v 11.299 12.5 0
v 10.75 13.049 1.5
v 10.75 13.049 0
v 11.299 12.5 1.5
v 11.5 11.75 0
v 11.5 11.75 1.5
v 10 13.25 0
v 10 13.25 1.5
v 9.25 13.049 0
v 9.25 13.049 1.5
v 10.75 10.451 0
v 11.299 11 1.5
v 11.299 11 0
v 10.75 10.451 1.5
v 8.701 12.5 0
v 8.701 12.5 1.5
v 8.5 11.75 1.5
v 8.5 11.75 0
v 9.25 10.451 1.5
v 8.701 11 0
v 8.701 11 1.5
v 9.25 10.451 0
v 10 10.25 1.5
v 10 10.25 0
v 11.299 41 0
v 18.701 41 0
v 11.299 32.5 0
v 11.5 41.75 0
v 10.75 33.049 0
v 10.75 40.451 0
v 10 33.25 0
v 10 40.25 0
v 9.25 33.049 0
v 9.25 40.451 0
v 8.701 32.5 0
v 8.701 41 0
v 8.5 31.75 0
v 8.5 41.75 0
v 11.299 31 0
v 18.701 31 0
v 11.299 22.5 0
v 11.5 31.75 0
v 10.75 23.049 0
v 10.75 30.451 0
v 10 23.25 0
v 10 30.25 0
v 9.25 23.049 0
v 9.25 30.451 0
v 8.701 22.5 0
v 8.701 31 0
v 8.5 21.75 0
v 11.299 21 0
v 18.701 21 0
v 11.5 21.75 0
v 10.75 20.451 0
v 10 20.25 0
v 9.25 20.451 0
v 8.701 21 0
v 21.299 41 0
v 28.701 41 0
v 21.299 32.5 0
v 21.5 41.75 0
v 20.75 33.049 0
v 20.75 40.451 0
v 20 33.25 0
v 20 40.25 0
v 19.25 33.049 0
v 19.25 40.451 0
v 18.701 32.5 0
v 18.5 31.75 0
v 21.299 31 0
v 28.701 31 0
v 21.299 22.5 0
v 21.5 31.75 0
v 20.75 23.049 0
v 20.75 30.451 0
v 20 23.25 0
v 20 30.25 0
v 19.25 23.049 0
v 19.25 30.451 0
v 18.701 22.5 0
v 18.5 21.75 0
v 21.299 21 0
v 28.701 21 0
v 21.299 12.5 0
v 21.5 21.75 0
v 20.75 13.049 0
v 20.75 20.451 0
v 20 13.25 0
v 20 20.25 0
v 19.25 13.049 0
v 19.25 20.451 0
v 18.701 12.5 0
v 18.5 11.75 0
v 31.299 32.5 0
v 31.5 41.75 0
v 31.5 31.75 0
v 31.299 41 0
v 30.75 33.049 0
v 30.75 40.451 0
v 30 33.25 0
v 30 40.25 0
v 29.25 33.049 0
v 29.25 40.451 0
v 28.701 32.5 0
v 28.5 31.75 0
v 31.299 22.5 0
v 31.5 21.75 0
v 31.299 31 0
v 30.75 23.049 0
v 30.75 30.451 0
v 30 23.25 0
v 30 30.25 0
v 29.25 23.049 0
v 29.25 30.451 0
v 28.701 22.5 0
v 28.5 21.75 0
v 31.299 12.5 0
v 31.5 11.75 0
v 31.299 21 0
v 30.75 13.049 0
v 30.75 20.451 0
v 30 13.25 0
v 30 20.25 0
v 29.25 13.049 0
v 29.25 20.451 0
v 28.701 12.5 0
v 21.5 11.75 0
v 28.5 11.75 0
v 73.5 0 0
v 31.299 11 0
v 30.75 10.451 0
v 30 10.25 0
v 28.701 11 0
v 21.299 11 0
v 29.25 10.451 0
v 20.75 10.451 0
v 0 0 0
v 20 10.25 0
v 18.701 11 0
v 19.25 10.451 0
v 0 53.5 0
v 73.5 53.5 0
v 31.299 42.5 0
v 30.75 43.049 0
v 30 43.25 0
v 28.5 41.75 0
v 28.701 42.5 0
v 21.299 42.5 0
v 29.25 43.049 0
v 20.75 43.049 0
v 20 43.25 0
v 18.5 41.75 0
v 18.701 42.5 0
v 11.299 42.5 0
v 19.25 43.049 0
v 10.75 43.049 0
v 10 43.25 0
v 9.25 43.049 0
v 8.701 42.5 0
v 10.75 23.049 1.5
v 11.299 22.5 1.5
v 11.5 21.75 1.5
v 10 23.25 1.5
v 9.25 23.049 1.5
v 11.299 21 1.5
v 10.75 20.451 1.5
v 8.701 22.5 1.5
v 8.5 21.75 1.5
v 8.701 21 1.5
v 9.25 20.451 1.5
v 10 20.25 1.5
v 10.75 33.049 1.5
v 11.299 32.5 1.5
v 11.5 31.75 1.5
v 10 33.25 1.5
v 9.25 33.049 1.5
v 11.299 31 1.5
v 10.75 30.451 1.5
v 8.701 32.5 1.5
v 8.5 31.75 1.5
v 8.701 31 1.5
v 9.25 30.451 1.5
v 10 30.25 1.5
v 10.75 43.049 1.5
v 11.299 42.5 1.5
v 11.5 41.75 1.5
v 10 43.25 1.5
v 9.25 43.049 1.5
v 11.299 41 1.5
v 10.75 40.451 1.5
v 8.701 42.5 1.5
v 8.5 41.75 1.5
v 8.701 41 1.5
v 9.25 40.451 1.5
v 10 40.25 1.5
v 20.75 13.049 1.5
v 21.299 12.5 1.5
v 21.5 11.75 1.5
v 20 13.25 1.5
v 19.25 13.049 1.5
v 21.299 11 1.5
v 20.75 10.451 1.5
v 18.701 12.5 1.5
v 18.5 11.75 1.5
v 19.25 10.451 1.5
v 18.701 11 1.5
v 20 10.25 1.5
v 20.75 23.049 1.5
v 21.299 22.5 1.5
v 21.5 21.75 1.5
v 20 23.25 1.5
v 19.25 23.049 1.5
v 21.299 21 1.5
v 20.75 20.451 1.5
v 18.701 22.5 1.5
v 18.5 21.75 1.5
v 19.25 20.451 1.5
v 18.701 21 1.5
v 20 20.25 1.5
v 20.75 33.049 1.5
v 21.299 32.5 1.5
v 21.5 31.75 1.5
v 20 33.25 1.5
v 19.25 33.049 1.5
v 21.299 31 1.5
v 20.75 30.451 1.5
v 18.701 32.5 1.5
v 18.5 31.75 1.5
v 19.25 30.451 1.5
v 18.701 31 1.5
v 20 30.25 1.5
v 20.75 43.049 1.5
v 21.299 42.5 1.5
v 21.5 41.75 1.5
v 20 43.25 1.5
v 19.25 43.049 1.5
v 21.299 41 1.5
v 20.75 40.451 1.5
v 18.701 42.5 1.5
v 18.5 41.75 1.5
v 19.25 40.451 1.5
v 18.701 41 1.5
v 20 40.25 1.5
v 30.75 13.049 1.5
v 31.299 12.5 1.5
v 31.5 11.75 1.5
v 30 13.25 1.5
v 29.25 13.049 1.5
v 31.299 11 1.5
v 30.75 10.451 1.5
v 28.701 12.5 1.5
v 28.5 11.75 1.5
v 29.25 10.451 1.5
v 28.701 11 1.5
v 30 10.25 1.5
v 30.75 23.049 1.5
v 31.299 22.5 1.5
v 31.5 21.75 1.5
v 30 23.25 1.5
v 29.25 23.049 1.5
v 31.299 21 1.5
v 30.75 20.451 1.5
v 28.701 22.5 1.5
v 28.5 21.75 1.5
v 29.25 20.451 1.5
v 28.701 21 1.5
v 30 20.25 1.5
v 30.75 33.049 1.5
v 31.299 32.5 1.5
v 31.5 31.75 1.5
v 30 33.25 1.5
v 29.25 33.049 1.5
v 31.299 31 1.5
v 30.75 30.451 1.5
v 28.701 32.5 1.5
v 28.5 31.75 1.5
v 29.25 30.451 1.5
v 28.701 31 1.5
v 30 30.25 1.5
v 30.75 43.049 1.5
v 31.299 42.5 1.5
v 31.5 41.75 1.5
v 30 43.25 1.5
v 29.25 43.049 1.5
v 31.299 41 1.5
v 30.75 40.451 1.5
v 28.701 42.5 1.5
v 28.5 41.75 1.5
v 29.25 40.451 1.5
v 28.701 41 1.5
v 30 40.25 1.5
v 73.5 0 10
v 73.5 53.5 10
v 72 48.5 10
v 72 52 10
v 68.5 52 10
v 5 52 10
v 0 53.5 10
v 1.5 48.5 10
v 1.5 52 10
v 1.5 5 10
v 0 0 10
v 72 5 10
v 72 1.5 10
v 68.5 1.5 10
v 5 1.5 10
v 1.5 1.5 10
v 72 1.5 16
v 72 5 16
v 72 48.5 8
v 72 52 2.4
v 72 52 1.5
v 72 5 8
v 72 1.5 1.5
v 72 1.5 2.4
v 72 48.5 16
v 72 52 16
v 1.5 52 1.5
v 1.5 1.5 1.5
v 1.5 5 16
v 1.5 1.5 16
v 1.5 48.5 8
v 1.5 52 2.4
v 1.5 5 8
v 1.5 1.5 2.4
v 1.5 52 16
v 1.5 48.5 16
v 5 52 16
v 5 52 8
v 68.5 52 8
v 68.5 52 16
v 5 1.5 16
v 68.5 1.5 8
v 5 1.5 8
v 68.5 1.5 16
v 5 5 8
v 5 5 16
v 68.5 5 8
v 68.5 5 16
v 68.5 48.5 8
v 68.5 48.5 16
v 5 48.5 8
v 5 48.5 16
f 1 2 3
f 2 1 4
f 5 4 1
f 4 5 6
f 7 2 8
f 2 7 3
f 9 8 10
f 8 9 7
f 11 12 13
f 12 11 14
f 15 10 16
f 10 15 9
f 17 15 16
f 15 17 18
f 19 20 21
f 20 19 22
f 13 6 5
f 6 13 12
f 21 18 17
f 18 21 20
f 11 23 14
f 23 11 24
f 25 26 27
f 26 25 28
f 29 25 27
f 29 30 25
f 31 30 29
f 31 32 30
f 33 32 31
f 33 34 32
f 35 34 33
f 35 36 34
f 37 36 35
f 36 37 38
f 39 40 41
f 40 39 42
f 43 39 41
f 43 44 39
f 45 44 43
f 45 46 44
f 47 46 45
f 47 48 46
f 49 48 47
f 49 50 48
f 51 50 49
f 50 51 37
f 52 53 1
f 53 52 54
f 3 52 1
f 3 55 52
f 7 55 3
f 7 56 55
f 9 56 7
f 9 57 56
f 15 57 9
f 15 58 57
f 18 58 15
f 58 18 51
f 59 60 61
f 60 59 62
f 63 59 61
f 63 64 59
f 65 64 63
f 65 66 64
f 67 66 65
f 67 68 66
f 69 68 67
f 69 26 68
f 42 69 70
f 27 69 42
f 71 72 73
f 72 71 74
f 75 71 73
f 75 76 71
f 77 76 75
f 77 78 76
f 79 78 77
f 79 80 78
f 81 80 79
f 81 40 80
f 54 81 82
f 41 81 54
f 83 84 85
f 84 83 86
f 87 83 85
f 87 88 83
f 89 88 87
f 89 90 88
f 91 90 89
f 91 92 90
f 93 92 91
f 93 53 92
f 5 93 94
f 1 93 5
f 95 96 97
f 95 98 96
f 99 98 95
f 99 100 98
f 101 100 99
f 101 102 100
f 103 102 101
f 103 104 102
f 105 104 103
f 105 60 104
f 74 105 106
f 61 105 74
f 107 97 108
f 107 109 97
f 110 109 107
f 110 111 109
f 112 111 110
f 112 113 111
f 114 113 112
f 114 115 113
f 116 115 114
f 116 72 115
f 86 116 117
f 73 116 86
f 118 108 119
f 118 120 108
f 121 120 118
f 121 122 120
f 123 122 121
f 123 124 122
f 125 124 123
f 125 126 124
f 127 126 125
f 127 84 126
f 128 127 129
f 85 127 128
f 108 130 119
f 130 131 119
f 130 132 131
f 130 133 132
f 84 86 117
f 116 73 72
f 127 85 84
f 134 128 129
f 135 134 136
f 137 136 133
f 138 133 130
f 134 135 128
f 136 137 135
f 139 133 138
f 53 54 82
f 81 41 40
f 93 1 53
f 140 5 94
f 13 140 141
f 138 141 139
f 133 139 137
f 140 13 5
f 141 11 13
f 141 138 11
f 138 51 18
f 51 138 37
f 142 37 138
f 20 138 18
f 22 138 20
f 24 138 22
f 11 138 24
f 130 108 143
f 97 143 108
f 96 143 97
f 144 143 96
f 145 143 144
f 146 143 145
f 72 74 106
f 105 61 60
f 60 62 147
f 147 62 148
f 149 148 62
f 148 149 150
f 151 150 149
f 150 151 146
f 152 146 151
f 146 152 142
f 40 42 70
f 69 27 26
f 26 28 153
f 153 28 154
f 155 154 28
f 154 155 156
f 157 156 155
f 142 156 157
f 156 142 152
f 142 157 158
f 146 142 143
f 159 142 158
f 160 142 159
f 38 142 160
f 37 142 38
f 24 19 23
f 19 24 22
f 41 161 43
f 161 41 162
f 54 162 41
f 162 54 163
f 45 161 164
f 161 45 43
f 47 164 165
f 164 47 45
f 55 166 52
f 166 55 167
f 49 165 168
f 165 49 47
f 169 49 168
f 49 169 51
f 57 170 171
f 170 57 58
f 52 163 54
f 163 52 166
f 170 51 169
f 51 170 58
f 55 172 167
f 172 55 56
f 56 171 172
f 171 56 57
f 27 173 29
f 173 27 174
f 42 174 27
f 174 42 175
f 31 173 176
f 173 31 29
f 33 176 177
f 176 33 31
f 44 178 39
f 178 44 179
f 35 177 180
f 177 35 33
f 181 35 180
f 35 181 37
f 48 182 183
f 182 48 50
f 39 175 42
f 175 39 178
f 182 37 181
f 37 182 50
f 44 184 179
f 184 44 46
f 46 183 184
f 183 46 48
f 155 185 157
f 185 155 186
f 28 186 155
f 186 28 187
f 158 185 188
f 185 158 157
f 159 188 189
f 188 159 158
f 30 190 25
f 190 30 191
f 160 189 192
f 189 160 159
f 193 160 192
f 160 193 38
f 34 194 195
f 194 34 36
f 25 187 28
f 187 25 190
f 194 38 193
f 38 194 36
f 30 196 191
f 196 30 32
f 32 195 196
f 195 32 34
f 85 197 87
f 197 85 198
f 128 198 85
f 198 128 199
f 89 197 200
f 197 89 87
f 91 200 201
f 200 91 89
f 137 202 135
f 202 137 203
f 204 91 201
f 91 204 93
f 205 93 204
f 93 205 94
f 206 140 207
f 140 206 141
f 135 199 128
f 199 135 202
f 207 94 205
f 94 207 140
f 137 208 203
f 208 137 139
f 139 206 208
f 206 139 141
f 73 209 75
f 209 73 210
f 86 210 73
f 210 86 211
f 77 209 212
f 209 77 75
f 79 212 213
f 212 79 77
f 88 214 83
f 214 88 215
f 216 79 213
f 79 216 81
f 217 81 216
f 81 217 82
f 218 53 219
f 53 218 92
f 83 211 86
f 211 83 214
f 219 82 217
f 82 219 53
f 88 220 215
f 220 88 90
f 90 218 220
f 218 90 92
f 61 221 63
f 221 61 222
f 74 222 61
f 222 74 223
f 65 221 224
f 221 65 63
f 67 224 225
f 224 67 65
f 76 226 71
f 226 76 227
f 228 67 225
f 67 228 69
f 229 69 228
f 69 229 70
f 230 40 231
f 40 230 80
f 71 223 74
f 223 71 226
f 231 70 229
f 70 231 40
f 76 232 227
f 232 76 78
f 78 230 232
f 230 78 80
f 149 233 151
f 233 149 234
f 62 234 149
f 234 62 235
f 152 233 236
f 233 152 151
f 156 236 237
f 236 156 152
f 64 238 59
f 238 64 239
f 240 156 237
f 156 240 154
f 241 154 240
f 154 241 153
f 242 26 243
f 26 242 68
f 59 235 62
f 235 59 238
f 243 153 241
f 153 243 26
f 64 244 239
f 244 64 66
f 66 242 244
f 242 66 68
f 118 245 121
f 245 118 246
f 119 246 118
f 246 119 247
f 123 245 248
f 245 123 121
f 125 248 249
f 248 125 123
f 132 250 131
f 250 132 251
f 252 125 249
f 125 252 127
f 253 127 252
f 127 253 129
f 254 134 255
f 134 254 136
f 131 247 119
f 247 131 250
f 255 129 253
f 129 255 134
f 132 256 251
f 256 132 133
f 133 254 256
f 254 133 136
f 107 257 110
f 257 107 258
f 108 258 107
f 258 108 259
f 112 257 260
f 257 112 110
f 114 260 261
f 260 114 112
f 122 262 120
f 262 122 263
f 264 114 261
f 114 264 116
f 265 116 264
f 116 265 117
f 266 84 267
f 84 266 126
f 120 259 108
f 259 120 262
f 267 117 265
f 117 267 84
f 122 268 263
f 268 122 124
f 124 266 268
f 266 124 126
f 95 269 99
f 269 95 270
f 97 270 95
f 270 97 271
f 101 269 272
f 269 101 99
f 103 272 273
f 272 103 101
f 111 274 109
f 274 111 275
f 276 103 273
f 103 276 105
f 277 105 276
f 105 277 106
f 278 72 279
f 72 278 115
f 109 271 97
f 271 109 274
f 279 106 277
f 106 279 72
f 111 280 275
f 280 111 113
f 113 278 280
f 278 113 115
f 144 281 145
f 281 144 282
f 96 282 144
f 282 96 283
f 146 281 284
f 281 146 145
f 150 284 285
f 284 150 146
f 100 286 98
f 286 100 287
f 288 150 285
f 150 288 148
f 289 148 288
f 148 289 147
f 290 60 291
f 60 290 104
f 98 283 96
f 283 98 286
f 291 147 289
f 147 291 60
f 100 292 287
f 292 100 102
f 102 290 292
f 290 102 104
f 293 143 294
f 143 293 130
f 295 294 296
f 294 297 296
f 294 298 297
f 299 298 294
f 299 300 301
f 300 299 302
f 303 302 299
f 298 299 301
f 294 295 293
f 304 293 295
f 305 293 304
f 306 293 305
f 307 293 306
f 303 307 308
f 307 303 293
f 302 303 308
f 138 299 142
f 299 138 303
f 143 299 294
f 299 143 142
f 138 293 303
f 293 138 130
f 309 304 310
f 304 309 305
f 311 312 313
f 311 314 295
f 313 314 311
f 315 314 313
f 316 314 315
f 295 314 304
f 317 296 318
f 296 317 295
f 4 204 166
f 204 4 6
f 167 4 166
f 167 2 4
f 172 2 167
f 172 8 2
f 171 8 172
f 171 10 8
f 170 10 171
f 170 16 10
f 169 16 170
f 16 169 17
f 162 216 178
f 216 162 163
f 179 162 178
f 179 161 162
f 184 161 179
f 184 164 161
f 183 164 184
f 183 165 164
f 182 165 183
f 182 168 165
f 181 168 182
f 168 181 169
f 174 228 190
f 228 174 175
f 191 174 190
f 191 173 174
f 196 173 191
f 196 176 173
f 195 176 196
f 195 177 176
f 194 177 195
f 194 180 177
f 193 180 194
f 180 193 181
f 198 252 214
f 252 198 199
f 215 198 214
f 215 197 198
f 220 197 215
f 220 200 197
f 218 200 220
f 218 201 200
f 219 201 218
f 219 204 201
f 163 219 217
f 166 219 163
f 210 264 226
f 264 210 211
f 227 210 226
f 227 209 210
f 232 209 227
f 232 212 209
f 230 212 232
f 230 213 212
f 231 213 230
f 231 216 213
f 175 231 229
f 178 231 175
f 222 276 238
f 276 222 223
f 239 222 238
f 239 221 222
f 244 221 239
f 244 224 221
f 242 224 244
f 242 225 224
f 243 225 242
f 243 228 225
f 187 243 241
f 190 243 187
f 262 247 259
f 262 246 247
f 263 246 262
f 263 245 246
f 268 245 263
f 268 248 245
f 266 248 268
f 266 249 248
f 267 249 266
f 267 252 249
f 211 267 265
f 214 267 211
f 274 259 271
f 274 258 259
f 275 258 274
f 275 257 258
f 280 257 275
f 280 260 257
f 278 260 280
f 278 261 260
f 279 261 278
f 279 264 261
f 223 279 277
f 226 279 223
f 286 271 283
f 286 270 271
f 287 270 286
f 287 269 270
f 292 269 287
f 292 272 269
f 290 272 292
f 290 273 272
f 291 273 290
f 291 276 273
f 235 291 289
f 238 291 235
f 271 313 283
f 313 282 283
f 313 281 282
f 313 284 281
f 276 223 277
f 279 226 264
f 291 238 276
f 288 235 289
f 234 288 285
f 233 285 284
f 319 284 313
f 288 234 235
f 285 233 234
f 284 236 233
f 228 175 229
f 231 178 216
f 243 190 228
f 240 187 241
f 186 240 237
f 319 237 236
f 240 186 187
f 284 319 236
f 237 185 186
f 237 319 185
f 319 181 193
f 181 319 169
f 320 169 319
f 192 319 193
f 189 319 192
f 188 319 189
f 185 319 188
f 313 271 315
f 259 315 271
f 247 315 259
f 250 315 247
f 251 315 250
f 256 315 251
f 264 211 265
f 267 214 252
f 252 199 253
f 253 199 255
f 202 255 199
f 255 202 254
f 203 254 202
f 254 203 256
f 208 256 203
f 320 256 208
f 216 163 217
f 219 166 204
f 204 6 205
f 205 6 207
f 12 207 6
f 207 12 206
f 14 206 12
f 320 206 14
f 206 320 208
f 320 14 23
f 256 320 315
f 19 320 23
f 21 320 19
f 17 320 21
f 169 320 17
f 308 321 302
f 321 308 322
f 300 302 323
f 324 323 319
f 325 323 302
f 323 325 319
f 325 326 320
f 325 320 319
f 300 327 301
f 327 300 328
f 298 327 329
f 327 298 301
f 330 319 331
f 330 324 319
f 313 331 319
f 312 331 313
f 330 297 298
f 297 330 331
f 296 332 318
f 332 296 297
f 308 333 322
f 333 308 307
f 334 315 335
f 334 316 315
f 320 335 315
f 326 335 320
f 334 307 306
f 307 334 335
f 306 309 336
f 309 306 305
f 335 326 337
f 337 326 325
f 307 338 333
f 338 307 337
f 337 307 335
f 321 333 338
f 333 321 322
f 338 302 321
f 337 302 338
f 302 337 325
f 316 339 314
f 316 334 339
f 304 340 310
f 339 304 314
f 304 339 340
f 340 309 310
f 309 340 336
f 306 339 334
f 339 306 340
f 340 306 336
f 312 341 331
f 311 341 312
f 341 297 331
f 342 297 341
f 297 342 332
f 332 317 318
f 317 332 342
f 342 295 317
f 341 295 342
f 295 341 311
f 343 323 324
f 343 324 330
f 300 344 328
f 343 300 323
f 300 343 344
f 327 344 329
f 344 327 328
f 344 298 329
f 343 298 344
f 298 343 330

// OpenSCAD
difference(){
    cube([73.5,53.5,10]);
    translate([1.5,1.5,1.5])cube([70.5,50.5,20]);
for (i=[10:10:30]){
    for (j=[10:10:40]){
        translate([i,j+1.75,0])cylinder(d=3,h=3,$fn=12);
    }
}
}

pilar();
translate([73.5,0,0])rotate([0,0,90])pilar();
translate([73.5,53.5,0])rotate([0,0,180])pilar();
translate([0,53.5,0])rotate([0,0,-90])pilar();

module pilar(){
translate([1.5,1.5,8])cube([3.5,3.5,8]);
translate([0,0,8])rotate([0,180,270])
intersection(){
rotate([0,0,45])cylinder(d1=14.142,d2=0,h=8,$fn=4);
cube([10,10,10]);
}
}
